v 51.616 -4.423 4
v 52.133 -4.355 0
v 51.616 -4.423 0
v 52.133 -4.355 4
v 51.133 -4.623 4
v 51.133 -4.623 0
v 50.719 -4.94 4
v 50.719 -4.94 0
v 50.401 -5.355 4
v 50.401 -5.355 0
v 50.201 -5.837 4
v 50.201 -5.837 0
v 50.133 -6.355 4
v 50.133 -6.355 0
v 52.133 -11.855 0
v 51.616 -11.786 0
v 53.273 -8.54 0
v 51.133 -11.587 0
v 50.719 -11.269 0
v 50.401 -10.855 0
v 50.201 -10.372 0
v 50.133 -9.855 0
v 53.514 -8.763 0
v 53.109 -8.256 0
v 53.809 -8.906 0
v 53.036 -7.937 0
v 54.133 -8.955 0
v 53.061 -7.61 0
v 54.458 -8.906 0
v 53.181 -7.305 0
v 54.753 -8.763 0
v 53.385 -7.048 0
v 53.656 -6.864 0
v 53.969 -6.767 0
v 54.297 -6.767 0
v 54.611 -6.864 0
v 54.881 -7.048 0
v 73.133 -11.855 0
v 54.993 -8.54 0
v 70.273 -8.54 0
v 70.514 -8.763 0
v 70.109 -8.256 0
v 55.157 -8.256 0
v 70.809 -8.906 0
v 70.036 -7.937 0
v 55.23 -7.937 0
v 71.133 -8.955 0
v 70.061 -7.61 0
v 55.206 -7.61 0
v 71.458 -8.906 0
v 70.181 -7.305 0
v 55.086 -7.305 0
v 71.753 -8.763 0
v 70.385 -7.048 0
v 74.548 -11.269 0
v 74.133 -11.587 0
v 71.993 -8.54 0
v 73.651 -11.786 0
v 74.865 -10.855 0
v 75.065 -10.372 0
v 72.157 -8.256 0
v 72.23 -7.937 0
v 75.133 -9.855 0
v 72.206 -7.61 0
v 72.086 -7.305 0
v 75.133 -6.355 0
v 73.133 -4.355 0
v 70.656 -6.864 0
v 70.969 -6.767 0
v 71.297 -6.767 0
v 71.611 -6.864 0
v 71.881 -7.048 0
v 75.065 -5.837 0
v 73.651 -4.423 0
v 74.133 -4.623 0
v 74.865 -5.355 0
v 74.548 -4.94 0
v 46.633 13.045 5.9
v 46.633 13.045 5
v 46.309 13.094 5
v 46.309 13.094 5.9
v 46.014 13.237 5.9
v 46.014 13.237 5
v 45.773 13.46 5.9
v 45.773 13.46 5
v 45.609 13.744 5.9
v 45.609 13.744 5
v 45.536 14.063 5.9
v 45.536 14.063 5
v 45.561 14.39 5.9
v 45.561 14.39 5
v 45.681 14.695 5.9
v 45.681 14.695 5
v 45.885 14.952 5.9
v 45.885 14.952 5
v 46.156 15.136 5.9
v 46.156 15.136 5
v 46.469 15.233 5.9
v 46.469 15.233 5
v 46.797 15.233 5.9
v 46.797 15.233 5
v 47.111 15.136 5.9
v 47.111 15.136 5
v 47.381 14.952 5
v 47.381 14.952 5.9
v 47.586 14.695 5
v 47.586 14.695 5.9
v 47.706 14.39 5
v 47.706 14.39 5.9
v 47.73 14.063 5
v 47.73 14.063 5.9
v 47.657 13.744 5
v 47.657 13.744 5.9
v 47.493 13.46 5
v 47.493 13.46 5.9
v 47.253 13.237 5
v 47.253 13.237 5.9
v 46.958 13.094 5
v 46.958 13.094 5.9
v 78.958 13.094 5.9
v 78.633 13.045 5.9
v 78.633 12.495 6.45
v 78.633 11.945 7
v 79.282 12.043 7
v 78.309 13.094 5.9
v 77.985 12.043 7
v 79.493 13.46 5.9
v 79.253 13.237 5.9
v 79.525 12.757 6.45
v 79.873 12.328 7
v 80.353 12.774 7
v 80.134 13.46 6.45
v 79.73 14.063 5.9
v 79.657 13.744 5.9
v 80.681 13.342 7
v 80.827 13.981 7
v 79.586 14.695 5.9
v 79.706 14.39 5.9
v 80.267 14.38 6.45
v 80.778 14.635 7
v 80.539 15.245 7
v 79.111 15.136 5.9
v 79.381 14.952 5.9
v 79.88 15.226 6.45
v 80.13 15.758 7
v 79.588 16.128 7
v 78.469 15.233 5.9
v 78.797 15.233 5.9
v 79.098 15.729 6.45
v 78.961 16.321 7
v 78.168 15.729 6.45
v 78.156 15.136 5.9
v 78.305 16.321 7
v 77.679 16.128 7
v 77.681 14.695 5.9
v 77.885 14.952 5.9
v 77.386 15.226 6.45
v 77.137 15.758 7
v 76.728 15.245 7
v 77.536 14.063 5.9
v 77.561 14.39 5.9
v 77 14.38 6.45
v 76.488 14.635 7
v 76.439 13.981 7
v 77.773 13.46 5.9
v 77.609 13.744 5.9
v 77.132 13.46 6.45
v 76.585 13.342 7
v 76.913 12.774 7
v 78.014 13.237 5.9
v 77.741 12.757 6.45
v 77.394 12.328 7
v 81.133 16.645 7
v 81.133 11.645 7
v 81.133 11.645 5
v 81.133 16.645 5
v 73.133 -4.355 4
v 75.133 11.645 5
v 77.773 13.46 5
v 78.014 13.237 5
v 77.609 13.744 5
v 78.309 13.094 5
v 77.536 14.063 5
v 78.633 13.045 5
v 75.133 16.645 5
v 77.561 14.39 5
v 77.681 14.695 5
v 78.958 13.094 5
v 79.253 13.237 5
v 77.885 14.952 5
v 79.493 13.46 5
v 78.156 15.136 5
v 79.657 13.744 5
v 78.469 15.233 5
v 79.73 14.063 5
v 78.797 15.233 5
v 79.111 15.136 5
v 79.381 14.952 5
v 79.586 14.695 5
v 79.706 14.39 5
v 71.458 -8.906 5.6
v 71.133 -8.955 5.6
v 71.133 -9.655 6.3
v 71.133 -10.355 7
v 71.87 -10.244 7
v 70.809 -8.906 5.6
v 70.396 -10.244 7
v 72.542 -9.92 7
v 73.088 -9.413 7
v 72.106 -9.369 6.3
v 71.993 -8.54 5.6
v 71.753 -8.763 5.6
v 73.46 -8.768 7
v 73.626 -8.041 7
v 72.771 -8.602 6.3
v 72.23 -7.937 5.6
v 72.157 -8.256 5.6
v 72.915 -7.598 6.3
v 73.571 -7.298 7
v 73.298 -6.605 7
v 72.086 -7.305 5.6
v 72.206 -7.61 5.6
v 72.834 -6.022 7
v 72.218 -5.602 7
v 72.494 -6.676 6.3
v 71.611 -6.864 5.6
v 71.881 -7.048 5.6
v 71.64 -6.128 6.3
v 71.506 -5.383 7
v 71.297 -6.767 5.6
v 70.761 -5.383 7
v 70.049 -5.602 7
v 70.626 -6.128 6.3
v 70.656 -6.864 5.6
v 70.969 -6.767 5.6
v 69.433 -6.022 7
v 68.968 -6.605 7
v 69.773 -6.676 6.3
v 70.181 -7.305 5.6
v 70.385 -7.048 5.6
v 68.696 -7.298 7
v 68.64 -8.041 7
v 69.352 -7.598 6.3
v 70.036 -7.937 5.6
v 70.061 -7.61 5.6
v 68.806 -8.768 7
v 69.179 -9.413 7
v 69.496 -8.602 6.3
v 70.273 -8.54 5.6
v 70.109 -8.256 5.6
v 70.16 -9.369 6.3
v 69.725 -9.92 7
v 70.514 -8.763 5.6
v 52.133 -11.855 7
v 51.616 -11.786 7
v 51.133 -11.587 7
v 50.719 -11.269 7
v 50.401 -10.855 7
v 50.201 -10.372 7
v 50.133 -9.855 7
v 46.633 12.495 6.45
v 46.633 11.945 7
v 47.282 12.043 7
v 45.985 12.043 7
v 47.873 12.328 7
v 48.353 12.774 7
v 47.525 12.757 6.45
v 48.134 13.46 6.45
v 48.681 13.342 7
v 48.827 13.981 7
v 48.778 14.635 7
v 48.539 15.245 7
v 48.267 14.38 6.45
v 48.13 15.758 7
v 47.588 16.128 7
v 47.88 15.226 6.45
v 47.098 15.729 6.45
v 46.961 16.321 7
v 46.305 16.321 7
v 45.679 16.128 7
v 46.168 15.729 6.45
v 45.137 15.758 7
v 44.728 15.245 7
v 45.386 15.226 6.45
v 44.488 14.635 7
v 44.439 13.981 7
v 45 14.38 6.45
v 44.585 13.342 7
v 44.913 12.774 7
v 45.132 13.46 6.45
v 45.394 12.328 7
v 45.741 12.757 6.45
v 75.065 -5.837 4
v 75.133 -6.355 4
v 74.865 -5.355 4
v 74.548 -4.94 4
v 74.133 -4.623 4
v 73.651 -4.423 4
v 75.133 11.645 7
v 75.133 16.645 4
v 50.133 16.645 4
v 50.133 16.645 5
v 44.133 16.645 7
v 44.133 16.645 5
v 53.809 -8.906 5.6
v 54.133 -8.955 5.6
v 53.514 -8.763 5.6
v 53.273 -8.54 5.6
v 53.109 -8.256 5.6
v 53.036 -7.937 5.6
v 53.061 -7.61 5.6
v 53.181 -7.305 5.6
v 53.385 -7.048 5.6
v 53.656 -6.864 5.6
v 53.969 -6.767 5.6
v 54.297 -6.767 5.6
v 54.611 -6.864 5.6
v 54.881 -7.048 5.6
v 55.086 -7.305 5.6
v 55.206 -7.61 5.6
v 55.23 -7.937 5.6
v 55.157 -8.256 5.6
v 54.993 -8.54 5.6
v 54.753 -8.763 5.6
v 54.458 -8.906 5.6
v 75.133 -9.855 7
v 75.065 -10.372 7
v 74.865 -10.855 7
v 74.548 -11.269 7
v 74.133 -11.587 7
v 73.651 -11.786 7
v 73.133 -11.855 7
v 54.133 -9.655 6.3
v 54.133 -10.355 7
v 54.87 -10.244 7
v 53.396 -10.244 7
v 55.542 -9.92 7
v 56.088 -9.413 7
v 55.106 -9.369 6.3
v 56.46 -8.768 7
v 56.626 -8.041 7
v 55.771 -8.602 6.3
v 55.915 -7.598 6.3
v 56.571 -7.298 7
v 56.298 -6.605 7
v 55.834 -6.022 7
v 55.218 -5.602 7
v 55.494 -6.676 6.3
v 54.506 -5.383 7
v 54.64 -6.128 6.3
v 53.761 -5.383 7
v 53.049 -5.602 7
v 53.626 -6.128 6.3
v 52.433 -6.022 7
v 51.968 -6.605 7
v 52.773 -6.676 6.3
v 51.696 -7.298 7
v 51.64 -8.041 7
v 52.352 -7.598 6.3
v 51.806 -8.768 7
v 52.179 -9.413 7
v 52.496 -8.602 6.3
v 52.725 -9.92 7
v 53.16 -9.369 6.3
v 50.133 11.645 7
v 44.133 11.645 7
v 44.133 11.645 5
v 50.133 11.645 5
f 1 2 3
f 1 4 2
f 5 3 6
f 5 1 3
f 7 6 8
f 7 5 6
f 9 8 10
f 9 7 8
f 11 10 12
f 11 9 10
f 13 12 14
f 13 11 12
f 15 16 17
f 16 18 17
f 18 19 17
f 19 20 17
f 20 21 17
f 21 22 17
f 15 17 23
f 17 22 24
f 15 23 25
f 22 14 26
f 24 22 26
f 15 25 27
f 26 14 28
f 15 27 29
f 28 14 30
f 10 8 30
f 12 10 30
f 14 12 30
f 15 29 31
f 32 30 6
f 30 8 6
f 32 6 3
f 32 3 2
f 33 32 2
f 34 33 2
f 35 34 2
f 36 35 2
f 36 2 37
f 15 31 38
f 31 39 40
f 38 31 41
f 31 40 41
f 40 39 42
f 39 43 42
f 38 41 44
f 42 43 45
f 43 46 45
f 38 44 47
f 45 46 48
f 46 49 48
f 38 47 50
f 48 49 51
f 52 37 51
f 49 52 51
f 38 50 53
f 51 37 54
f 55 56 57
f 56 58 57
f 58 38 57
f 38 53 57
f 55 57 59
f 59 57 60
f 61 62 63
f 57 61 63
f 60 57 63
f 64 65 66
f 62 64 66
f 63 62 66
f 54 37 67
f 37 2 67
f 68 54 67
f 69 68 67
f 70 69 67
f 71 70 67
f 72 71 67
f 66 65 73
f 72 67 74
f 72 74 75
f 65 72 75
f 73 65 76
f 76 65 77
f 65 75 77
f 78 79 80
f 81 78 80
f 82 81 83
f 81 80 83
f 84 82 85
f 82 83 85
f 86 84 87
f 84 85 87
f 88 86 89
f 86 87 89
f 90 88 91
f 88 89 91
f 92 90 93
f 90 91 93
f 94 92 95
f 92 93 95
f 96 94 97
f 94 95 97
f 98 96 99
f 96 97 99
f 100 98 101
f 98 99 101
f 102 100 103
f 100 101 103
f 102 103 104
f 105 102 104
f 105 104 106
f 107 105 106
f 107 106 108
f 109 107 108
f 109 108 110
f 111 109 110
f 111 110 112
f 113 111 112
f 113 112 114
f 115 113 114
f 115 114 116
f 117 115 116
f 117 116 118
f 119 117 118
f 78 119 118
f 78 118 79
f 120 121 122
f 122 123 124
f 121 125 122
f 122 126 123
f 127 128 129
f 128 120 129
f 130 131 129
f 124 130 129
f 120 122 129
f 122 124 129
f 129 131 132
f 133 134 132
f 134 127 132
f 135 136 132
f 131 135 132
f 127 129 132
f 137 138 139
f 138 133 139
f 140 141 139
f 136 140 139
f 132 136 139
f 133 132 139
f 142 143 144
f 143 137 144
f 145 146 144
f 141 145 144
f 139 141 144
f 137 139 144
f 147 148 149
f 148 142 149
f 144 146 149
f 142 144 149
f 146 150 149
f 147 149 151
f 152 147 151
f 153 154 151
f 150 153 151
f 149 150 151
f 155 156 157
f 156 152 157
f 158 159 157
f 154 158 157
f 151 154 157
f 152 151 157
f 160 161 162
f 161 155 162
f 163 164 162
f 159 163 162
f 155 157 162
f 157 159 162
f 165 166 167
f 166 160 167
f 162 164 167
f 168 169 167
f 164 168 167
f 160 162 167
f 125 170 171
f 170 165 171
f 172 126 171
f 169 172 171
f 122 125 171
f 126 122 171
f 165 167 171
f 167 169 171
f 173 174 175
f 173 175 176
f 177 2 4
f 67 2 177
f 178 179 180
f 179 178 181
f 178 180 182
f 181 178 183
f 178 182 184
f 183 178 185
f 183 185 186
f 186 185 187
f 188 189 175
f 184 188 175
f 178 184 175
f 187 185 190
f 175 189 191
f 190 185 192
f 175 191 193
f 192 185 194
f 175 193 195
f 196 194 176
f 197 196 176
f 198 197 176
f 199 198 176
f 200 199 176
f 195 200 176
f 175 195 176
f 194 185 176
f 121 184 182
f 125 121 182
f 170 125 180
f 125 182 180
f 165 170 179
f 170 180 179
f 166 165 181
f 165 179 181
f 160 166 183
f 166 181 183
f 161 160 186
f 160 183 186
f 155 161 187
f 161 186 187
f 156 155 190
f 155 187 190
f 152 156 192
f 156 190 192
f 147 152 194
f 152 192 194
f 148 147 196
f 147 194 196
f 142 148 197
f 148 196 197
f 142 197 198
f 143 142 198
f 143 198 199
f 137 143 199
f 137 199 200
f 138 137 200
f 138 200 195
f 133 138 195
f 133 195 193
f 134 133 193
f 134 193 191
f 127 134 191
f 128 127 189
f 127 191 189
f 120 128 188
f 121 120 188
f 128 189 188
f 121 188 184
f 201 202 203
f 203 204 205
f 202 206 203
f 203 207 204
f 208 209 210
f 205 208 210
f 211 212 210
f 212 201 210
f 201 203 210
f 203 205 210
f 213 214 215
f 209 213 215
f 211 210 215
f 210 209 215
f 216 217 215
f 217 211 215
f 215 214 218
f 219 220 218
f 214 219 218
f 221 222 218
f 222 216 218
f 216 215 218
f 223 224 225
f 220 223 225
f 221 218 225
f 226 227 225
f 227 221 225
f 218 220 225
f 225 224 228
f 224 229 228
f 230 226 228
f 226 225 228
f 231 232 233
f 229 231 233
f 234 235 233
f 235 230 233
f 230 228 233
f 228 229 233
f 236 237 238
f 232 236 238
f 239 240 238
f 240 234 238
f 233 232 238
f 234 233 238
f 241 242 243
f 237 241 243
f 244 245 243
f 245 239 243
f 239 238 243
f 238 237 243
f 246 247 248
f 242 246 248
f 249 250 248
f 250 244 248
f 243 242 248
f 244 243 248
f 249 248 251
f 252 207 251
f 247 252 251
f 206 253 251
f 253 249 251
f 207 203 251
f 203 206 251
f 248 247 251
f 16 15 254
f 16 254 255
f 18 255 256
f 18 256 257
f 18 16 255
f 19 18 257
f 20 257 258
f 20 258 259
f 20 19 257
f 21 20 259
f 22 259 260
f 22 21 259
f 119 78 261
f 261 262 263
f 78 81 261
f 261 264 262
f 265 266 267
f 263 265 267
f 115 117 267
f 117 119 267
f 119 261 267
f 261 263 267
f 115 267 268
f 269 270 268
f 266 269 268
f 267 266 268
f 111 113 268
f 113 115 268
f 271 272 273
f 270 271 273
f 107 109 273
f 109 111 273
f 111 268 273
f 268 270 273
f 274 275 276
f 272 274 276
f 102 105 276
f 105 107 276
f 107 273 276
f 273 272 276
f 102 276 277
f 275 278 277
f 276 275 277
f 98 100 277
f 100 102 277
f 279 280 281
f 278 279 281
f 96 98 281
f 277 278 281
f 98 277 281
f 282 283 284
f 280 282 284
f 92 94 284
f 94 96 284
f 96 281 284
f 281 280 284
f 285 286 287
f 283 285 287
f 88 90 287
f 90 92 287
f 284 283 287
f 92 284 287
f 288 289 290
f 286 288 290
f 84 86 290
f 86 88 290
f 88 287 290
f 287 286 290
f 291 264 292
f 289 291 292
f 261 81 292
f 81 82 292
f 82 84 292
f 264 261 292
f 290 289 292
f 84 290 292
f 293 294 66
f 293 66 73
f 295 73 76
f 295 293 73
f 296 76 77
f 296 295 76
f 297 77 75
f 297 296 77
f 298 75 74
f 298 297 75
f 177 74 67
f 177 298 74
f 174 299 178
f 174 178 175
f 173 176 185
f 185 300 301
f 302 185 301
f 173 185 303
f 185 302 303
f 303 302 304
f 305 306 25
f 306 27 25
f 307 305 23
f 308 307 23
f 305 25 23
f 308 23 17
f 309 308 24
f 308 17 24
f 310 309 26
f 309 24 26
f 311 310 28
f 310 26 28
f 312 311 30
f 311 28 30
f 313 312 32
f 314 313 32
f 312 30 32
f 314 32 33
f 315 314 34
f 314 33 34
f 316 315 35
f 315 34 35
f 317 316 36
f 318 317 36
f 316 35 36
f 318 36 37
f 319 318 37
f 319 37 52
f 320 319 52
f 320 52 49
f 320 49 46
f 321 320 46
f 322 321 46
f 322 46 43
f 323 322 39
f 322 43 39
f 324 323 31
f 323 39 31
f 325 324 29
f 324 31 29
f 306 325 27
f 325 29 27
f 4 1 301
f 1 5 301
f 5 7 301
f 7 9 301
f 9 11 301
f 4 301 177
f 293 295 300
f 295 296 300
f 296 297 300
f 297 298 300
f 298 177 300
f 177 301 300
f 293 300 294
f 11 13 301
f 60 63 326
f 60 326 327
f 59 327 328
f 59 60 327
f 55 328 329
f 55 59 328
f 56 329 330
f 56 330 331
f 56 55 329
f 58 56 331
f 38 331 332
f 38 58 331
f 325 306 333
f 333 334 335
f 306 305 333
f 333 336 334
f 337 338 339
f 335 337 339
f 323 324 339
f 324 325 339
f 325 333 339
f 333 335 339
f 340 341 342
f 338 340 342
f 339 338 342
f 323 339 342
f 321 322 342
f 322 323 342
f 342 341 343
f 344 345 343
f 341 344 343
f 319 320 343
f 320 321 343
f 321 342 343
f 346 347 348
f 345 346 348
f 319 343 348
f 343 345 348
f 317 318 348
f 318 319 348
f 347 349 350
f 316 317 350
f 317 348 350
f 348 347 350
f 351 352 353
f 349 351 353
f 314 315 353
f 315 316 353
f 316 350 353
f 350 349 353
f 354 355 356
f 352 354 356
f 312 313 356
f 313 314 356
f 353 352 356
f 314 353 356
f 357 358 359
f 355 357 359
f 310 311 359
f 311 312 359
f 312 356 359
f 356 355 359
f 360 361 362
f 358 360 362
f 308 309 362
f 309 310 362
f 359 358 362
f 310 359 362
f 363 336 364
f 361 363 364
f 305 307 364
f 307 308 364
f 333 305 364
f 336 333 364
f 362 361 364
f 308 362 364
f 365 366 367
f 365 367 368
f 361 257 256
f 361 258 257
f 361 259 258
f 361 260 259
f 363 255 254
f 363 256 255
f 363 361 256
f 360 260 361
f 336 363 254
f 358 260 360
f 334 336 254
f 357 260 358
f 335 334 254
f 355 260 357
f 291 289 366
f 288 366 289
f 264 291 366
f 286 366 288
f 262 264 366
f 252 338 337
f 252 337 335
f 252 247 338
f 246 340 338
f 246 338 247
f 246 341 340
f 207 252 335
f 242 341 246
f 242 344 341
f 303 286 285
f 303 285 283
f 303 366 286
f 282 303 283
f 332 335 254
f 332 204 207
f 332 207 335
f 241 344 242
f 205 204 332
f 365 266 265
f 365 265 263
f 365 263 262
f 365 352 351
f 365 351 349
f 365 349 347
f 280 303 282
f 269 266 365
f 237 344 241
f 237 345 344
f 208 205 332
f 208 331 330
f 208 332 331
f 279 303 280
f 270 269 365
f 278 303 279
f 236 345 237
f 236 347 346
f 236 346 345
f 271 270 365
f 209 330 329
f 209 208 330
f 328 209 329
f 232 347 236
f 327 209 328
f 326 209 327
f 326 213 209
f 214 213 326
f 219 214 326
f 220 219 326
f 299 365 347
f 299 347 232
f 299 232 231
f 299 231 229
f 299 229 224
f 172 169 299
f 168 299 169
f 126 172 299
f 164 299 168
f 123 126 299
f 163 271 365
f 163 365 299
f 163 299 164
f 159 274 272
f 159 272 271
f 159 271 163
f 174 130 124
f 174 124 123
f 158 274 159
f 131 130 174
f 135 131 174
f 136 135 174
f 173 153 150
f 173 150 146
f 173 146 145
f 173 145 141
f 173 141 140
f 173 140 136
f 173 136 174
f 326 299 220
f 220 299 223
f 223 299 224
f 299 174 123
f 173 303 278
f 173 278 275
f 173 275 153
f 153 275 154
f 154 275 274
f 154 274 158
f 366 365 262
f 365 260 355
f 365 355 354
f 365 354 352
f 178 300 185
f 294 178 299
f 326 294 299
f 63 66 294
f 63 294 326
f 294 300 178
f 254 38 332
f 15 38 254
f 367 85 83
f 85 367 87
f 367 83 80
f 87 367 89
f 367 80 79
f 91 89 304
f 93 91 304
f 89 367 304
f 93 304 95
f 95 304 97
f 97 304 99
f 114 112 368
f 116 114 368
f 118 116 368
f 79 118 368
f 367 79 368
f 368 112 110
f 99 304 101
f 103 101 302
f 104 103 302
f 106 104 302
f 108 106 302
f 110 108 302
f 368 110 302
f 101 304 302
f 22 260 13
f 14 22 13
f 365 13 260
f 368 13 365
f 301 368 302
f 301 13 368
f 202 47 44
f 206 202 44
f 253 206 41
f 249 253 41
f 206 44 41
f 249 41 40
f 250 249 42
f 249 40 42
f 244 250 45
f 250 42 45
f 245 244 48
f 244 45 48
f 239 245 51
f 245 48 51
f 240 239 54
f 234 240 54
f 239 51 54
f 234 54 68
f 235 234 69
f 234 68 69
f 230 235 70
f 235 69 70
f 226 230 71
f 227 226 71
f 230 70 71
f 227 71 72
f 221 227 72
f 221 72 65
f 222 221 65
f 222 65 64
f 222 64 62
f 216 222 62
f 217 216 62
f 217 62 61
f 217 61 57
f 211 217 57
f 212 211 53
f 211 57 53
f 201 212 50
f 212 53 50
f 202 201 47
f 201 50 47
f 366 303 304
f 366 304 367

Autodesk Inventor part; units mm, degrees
ref_plane "YZ Plane" through (0, 0, 0) normal (1, 0, 0) x (0, 1, 0)
ref_plane "XZ Plane" through (0, 0, 0) normal (0, 1, 0) x (-1, 0, 0)
ref_plane "XY Plane" through (0, 0, 0) normal (0, 0, 1) x (1, 0, 0)
sketch "Skizze1" plane through (0, 0, 0) normal (0, 0, 1) x (1, 0, 0)
  line L0 (75.1333, -4.3546) -> (75.1333, -11.8546)
  line L1 (75.1333, -11.8546) -> (50.1333, -11.8546)
  line L2 (50.1333, -11.8546) -> (50.1333, -4.3546)
  line L3 (50.1333, -4.3546) -> (75.1333, -4.3546)
  point P0 (0, 0)
  dimension "d1" = 7.5
  dimension "d2" = 25
extrude "Extrusion1" add sketch "Skizze1" along normal blind 4
sketch "Skizze2" plane through (0, 0, 4) normal (0, 0, 1) x (1, 0, 0)
  line L0 (75.1333, 16.6454) -> (50.1333, 16.6454)
  line L1 (50.1333, 16.6454) -> (50.1333, -4.3546)
  line L2 (75.1333, -4.3546) -> (75.1333, 16.6454)
  line L3 (50.1333, -11.8546) -> (75.1333, -11.8546) projected
  line L4 (75.1333, -11.8546) -> (75.1333, -4.3546) projected
  line L5 (50.1333, -4.3546) -> (50.1333, -11.8546) projected
  line L6 (50.1333, 16.6454) -> (45.1333, 16.6454)
  line L7 (45.1333, 16.6454) -> (45.1333, 11.6454)
  line L8 (45.1333, 11.6454) -> (50.1333, 11.6454)
  line L9 (50.1333, 11.6454) -> (50.1333, 16.6454)
  line L10 (75.1333, 16.6454) -> (80.1333, 16.6454)
  line L11 (80.1333, 16.6454) -> (80.1333, 11.6454)
  line L12 (80.1333, 11.6454) -> (75.1333, 11.6454)
  line L13 (75.1333, 11.6454) -> (75.1333, 16.6454)
  point P0 (0, 0)
  dimension "d25" = 28.5
  dimension "d28" = 5
  dimension "d29" = 5
extrude "Extrusion2" add sketch "Skizze2" along normal blind 3 contours L2 L4 L3 L5 L1 L0
sketch "Skizze3" plane through (0, 0, 7) normal (0, 0, 1) x (1, 0, 0)
  line L0 (50.1333, 16.6454) -> (50.1333, -11.8546) projected
  line L1 (54.1333, -7.8546) -> (50.1333, -7.8546) construction
  line L2 (54.1333, -7.8546) -> (54.1333, -11.8546) construction
  line L3 (71.1333, -7.8546) -> (71.1333, -11.8546) construction
  line L4 (71.1333, -7.8546) -> (75.1333, -7.8546) construction
  line L5 (50.1333, -11.8546) -> (75.1333, -11.8546) construction
  line L6 (75.1333, -11.8546) -> (75.1333, 16.6454) construction
  point P0 (0, 0)
  dimension "d26" = 4
hole "Bohrung1" at (54.1333, -7.8546, 7) at (71.1333, -7.8546, 7) direction (0, 0, -1) diameter 2.2 end through all countersink diameter 5 countersink angle 90
fillet "Rundung1" radius 2 4 edges at (50.1333, -11.8546, 3.5) (75.1333, -11.8546, 3.5) (75.1333, -4.3546, 2) (50.1333, -4.3546, 2)
sketch "Skizze4" plane through (0, 0, 7) normal (0, 0, 1) x (1, 0, 0)
  line L0 (75.1333, -6.3546) -> (75.1333, 16.6454) projected
  line L1 (81.1333, 16.6454) -> (75.1333, 16.6454)
  line L2 (75.1333, 16.6454) -> (75.1333, 11.6454)
  line L3 (75.1333, 11.6454) -> (81.1333, 11.6454)
  line L4 (81.1333, 11.6454) -> (81.1333, 16.6454)
  line L5 (75.1333, 16.6454) -> (50.1333, 16.6454) projected
  line L6 (50.1333, 16.6454) -> (44.1333, 16.6454)
  line L7 (44.1333, 16.6454) -> (44.1333, 11.6454)
  line L8 (44.1333, 11.6454) -> (50.1333, 11.6454)
  line L9 (50.1333, 11.6454) -> (50.1333, 16.6454)
  point P0 (0, 0)
  dimension "d30" = 5
  dimension "d31" = 6
extrude "Extrusion3" add sketch "Skizze4" against normal blind 2
sketch "Skizze5" plane through (0, 0, 7) normal (0, 0, 1) x (1, 0, 0)
  line L0 (44.1333, 11.6454) -> (44.1333, 16.6454) projected
  line L1 (44.1333, 14.1454) -> (46.6333, 14.1454)
  line L2 (78.6333, 14.1454) -> (81.1333, 14.1454)
  line L3 (81.1333, 11.6454) -> (81.1333, 16.6454) projected
  line L4 (44.1333, 11.6454) -> (50.1333, 11.6454) projected
  point P0 (0, 0)
  dimension "d34" = 2.5
  dimension "d42" = 2.5
  dimension "d43" = 2.5
hole "Bohrung2" at (78.6333, 14.1454, 7) at (46.6333, 14.1454, 7) direction (0, 0, -1) diameter 2.2 end through all countersink diameter 4.4 countersink angle 90 clearance for "Flachkopfmaschinenschraube" size "M2" standard "ANSI Metrisches M Profil"
properties part number "Sliderhalter" material "PC/ABS-Kunststoff, 3DDruck, PLA"
